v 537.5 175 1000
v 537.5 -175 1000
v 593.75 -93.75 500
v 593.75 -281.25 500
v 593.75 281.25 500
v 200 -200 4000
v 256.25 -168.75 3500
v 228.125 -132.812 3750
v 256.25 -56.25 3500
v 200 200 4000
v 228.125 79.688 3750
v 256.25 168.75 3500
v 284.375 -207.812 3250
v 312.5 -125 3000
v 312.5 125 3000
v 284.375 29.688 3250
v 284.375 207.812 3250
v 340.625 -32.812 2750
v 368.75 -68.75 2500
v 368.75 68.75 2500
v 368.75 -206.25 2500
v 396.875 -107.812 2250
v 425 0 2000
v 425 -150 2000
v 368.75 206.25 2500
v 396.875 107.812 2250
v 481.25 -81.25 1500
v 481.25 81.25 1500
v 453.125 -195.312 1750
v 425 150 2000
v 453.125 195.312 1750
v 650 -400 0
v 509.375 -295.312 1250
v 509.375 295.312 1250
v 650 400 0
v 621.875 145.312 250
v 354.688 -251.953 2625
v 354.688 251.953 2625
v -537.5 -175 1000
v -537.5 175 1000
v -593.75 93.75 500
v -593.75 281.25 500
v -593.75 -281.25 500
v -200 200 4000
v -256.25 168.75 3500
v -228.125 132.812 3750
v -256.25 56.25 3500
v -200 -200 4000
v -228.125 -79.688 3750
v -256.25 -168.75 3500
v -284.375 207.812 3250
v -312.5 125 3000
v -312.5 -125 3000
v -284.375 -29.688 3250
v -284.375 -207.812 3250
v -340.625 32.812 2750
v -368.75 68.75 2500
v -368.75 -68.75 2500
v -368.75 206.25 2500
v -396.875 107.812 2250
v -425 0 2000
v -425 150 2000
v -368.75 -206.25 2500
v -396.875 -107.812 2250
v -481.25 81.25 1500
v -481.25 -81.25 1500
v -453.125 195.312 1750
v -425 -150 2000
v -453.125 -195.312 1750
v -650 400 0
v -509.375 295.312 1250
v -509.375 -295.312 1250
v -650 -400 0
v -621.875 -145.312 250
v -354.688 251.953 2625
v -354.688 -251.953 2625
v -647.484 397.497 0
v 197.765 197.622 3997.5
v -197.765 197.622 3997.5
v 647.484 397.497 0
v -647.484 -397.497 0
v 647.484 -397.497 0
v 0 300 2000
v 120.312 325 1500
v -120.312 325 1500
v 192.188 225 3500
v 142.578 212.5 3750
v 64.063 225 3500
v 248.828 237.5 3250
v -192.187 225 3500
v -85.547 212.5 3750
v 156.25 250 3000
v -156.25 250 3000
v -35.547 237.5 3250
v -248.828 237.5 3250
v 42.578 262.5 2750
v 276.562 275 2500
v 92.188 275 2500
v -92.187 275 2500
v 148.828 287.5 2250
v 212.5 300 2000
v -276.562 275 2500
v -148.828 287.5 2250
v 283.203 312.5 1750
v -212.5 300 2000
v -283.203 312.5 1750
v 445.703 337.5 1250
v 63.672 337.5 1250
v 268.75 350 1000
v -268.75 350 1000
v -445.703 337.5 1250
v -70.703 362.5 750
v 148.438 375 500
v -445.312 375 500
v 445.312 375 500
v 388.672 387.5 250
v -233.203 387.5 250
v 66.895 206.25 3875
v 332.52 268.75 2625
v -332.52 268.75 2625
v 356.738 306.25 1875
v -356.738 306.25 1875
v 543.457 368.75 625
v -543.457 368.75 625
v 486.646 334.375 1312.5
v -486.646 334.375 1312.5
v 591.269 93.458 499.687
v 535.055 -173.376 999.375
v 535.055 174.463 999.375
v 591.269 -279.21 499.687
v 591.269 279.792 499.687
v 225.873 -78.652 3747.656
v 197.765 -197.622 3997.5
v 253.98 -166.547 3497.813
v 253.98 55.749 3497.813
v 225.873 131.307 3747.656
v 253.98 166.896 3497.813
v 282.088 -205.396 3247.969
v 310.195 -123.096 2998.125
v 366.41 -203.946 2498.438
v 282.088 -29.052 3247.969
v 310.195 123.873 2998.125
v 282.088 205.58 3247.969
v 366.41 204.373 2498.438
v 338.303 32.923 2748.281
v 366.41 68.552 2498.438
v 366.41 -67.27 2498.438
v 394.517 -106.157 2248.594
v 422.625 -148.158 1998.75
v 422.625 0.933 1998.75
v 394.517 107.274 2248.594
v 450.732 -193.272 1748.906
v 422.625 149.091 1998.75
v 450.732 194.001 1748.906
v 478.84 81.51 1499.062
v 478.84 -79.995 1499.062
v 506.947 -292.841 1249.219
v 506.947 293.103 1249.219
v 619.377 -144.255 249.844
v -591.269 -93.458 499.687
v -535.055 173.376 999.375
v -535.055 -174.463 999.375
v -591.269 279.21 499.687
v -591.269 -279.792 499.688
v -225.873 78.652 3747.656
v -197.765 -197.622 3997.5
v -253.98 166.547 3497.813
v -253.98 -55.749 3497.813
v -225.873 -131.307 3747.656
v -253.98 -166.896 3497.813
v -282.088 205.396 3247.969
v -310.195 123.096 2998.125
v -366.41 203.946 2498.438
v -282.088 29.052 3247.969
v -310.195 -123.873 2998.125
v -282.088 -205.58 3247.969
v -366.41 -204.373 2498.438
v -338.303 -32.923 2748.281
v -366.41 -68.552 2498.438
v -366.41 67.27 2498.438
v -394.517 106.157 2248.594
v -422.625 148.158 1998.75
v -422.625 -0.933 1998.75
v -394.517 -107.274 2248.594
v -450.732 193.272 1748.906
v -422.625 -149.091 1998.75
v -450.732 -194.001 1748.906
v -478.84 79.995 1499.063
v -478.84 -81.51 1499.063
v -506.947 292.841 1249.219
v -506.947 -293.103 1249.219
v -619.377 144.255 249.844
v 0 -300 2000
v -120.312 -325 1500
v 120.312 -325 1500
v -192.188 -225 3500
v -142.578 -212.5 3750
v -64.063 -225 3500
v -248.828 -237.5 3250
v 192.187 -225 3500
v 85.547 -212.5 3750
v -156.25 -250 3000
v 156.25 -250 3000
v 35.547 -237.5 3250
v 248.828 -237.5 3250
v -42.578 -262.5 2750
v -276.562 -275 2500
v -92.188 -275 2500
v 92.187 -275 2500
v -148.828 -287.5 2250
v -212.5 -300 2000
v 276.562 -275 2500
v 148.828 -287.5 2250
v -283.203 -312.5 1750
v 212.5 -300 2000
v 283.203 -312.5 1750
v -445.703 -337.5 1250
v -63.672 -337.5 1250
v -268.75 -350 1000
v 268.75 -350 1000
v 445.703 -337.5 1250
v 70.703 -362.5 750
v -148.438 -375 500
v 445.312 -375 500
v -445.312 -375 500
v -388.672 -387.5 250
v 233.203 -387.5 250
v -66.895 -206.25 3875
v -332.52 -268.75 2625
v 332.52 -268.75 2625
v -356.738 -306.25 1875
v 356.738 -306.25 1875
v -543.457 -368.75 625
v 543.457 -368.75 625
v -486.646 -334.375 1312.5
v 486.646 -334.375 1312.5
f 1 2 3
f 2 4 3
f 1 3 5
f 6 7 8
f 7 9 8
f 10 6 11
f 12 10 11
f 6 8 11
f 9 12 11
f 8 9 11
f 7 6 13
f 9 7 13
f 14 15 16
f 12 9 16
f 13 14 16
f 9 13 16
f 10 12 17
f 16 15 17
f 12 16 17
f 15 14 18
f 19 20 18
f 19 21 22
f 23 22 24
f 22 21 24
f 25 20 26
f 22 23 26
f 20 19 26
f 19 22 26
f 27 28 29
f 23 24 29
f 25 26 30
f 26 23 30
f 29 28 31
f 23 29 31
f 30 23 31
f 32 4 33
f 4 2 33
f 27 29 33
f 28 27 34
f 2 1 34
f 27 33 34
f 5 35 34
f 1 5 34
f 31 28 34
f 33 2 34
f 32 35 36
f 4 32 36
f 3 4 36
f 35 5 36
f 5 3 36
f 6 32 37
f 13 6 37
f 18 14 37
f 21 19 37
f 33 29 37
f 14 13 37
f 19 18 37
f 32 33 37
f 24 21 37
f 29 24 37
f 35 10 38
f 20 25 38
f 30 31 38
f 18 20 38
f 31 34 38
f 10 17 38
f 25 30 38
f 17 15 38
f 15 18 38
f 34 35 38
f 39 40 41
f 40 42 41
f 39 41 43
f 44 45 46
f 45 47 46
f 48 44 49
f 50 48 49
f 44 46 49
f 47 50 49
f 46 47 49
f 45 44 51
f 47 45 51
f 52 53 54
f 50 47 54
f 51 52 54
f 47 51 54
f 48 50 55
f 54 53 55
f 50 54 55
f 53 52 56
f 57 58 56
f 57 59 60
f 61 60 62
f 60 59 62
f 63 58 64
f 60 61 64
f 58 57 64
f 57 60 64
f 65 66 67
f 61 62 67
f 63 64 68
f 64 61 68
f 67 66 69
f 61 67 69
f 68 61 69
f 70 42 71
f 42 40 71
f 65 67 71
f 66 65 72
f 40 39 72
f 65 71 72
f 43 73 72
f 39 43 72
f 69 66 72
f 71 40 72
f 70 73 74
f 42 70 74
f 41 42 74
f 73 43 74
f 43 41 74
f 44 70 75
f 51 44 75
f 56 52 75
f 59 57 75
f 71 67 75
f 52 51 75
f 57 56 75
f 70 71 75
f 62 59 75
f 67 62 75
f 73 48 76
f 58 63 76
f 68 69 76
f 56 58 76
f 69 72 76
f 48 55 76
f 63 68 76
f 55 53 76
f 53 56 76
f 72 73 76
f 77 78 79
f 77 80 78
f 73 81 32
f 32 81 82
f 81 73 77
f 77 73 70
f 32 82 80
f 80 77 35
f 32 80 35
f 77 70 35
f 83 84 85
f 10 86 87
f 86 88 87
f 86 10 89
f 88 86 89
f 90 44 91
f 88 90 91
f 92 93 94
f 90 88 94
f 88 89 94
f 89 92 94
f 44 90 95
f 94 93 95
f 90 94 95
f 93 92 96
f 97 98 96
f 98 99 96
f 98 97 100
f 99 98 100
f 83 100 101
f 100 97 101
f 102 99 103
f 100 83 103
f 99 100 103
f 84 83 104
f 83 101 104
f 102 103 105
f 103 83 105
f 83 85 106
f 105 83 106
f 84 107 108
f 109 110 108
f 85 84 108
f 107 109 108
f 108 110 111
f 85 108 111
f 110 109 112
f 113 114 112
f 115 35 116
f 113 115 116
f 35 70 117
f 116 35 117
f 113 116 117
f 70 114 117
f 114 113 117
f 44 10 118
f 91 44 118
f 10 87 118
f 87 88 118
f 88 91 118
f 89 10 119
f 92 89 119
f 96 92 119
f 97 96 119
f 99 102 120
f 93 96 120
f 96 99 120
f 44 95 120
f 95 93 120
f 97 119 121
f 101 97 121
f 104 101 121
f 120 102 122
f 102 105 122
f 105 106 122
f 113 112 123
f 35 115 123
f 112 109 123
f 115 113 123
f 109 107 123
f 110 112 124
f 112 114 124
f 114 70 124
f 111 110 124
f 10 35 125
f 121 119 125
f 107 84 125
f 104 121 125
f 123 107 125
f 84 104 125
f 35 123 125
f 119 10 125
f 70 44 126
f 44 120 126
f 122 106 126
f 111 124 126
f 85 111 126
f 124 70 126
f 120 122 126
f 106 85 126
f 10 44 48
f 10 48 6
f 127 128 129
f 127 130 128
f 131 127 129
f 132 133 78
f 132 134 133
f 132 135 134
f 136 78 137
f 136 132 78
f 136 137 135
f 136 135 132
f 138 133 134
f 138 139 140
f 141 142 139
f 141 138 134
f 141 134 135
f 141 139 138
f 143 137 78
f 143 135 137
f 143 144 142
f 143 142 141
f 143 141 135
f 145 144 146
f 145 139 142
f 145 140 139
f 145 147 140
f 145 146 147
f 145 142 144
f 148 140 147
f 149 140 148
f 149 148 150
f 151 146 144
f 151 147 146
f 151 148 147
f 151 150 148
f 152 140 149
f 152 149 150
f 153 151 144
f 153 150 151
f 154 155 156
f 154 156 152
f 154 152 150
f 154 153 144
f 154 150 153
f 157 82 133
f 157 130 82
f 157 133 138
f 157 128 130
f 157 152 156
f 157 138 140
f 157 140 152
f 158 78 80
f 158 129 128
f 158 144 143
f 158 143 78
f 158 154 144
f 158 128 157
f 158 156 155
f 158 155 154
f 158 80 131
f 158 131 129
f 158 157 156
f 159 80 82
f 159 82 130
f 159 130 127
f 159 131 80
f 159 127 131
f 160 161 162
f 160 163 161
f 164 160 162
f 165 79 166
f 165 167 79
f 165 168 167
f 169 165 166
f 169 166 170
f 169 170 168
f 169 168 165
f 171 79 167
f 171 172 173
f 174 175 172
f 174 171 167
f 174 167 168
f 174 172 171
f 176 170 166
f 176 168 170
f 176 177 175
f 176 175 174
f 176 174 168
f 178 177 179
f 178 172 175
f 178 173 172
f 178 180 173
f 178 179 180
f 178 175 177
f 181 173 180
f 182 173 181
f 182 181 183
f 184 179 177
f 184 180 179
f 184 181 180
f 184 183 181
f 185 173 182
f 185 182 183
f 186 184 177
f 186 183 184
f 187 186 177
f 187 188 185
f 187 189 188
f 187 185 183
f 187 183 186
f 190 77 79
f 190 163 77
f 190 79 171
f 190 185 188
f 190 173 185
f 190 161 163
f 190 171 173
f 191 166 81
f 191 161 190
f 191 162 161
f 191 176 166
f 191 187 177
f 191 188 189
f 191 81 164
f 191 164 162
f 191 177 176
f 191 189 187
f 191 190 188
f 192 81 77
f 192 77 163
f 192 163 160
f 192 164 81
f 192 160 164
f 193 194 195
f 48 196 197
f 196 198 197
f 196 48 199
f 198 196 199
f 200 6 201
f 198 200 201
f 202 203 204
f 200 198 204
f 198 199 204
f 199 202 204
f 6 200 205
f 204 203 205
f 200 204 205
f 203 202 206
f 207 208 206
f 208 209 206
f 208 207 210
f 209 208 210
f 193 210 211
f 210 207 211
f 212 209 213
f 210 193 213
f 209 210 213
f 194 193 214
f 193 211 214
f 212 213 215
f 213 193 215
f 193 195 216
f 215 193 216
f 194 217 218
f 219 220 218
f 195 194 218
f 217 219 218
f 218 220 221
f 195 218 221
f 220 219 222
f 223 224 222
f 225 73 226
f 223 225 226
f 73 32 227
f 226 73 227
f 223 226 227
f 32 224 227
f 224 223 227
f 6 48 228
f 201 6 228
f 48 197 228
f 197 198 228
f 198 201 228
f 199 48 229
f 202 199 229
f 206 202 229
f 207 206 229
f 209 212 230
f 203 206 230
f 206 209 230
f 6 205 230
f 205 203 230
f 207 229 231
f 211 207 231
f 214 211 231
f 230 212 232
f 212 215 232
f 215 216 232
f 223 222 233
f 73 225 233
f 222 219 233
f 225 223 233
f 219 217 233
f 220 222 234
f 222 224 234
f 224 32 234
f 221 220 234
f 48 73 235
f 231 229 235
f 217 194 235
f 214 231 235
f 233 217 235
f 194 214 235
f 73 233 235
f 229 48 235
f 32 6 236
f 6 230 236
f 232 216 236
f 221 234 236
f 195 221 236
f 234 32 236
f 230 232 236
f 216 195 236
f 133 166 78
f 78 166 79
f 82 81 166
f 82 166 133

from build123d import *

# Parameters (mm, degrees)
F2_W = 400
F2_H = 400
F0_W = 1300
F0_H = 800
F4_T = -2.5


with BuildPart() as f3:
    # F2 (on offset) → F3 section 0
    with BuildSketch(Plane.XY.offset(4000)):
        Rectangle(F2_W, F2_H)
    # F0 (on Top) → F3 section 1
    with BuildSketch(Plane.XY):
        Rectangle(F0_W, F0_H)
    loft()

    # F4
    f4_openings = [f3.faces().sort_by_distance(p)[0] for p in [
        (0, 0, 0),
    ]]
    offset(amount=F4_T, openings=f4_openings, kind=Kind.INTERSECTION)


solid = f3.part
